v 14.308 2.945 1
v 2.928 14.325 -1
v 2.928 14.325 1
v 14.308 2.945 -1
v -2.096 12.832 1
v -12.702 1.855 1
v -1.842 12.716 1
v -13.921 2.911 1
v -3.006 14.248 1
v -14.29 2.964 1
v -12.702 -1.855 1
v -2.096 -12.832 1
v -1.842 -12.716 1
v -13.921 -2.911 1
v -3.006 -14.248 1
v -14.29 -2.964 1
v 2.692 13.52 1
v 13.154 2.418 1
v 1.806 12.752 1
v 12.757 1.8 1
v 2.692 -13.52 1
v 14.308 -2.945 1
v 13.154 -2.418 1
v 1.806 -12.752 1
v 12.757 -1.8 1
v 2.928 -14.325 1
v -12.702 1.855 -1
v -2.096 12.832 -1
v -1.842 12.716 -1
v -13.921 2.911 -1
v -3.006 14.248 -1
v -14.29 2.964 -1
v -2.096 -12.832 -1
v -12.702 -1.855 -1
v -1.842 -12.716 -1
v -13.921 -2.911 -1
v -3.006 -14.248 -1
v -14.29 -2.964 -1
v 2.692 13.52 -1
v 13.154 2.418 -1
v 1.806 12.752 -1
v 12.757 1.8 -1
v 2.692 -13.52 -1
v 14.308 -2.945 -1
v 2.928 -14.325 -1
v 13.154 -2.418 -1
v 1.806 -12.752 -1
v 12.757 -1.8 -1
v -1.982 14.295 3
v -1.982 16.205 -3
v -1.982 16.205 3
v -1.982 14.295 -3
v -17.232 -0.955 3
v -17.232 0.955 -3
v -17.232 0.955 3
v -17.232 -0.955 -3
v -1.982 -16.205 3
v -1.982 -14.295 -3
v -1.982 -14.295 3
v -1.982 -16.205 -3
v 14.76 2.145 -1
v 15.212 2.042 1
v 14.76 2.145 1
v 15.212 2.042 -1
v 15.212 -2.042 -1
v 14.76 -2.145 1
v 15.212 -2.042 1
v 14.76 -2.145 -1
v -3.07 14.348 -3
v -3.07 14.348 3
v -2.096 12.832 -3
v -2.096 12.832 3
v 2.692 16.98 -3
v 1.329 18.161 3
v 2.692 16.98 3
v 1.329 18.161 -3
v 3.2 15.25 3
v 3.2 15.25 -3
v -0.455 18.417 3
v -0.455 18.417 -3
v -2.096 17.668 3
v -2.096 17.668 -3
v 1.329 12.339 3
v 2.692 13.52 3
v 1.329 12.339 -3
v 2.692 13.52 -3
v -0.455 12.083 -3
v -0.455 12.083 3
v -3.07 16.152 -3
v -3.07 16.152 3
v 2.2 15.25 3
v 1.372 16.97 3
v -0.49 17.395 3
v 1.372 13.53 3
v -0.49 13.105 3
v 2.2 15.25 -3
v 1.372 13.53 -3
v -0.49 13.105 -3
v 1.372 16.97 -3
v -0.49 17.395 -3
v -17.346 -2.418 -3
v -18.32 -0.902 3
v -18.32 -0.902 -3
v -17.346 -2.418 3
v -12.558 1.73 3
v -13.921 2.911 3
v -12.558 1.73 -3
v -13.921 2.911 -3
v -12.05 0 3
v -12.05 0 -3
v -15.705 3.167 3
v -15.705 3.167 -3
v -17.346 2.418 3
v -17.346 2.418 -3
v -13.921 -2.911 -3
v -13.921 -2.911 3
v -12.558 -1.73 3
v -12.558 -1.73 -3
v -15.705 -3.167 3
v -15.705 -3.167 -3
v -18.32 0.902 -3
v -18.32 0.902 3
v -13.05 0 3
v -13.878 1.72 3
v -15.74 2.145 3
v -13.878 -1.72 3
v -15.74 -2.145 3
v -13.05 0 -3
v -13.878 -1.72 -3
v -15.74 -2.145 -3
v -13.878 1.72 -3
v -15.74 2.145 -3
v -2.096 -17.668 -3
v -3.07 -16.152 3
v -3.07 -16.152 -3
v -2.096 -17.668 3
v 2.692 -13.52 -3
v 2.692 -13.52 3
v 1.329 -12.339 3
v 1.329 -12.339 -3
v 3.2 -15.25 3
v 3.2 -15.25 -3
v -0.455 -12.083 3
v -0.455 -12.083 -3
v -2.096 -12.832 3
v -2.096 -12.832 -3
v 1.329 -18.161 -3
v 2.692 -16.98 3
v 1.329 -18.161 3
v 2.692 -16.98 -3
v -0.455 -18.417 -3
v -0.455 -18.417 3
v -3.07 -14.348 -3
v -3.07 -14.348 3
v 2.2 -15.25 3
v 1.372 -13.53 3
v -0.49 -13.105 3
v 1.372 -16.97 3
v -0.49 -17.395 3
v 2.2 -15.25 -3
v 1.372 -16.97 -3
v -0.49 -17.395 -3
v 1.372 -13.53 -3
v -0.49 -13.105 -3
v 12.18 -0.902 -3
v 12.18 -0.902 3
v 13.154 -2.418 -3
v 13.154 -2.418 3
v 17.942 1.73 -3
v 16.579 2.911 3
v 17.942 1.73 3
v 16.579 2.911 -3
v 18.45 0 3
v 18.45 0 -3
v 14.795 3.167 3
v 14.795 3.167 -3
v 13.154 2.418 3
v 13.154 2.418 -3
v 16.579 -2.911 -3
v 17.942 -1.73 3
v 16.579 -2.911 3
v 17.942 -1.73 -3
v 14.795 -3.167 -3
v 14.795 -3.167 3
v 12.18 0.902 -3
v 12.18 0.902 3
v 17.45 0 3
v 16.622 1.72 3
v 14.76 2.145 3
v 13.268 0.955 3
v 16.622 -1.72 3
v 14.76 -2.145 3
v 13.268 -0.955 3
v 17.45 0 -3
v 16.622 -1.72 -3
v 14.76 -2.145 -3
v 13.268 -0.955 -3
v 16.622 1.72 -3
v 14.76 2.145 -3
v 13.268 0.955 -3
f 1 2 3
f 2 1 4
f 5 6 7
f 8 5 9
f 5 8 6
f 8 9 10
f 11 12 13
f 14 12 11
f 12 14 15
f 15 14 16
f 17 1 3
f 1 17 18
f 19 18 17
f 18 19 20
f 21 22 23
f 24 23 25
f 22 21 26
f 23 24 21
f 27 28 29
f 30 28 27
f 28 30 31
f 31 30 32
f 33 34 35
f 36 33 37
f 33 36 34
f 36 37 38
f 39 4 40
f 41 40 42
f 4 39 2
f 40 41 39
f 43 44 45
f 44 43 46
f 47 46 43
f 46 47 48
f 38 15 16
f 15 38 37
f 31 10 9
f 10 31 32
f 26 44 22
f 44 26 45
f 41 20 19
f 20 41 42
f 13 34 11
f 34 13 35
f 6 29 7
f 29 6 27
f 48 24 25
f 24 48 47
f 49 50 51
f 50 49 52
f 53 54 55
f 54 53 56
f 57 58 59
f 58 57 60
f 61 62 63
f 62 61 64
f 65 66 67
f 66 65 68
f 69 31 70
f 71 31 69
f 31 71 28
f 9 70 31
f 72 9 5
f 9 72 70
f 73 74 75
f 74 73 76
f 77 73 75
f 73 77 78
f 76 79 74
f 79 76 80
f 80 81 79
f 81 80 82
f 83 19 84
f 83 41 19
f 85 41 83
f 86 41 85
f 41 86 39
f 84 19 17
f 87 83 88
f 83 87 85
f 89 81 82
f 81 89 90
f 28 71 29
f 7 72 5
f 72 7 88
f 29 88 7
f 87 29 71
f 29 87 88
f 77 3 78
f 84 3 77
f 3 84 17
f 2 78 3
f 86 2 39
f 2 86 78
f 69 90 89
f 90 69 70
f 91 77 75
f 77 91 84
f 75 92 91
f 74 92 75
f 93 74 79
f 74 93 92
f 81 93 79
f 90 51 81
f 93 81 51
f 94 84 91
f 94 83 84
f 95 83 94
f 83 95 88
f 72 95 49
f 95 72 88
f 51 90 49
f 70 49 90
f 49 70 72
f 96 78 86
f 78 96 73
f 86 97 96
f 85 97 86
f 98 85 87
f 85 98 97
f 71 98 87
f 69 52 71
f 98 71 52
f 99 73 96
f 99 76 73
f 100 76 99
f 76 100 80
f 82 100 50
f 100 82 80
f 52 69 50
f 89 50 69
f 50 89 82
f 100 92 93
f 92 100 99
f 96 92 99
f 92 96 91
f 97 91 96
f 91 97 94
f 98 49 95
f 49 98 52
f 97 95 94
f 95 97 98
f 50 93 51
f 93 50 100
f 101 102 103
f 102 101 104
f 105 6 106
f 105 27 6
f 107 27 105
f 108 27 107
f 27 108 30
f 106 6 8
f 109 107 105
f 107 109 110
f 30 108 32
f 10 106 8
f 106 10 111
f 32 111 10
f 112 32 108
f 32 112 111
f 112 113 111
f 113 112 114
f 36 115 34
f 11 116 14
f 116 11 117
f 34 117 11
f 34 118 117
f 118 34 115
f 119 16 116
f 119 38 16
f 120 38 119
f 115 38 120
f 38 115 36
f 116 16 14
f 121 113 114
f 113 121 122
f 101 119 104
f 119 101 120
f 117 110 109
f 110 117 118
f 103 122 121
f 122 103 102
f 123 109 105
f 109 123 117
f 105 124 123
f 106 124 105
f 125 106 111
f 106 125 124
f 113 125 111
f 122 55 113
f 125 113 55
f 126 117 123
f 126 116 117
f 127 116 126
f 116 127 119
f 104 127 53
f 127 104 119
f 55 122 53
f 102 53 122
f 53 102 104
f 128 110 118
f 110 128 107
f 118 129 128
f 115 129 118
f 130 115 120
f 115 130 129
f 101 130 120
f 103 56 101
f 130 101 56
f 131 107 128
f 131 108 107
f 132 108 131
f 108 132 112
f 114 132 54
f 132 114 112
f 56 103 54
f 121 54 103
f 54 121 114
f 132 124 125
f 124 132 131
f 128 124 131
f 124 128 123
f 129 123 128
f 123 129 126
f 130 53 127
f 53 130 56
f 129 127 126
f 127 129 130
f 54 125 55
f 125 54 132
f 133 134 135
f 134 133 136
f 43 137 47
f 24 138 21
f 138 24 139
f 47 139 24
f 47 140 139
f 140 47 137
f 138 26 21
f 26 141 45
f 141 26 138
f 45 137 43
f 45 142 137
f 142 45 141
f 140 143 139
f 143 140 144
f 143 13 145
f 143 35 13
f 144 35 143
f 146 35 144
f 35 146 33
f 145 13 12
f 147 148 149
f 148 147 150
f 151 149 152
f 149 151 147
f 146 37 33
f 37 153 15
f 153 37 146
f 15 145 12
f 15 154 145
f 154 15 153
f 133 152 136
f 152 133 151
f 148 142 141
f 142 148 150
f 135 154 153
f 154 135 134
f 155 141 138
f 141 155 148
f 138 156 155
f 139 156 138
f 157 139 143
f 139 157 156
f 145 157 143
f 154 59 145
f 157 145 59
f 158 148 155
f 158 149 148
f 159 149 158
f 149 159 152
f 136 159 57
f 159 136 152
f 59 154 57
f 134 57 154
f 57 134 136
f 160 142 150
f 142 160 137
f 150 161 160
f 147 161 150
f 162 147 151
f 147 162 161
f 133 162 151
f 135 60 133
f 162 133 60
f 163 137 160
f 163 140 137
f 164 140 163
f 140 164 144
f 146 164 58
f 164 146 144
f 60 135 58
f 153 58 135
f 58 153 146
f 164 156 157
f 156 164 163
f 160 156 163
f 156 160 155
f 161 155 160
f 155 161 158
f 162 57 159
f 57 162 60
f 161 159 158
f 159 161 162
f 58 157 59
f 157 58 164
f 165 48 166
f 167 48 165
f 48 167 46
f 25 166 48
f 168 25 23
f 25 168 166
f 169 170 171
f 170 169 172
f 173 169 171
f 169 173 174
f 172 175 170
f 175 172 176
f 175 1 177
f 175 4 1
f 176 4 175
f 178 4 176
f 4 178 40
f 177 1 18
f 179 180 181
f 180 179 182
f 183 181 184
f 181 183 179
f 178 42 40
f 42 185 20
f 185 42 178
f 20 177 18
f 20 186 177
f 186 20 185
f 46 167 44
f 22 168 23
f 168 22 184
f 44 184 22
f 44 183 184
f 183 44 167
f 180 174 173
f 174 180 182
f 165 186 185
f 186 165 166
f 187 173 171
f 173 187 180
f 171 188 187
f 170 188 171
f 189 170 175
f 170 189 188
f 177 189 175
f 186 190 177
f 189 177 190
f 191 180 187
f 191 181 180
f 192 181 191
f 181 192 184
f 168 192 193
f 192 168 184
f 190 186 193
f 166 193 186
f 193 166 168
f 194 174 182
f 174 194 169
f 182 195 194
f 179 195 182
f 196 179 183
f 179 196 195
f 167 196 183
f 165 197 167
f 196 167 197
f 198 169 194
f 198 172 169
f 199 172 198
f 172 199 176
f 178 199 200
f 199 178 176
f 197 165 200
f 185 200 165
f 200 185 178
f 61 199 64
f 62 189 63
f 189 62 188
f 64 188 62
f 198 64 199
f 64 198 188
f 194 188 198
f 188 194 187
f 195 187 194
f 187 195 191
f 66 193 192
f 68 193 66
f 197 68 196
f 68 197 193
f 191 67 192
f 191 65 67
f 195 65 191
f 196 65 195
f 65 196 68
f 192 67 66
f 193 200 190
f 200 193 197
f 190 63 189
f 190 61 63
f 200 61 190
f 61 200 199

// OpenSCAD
    /* This project was built by Stas Wright in an effort to make 3D Printable standoffs for quad copters that's adjustable/customizable.
    This is my 2nd OpenSCAD project & the first one built for Thingiverse Customization.
    Hopefully it works, and hopefully others can improve on it.
*/

// Standoff Height
standoff_height = 6; // [0:0.1:100]

// Standoff Inner Radius 2.2 = M2, 3.2 = M3
standoff_radius = 2.2; // [0:0.1:100]

// Standoff thickness (made this customizable due to different 3D printer nozzles)
standoff_thickness = 1;  // [0:0.1:100] 

// Distance of the holes from each other.  ex 20mm x 20mm Flight Controller.
mounting_hole_distance = 30.5; // [0:0.1:500]

// Height of the arms that connect the standoffs.
connector_height = 2; // [0:0.1:100] 


/* [Hidden] */
cyl_outside_r = standoff_radius + standoff_thickness;
mnt_distance = mounting_hole_distance/2;
mnt_holes_num = 4;

difference(){
 rotate([0,0,45]){ //this rotates the connecting arms 45degress so the corners meet the standoffs.
    difference(){
          cube([mnt_distance*1.6,mnt_distance*1.6,connector_height],true);
            cube([mnt_distance*1.35,mnt_distance*1.35,connector_height],true);
            }} // This creates the inside hole.
for (i=[1:mnt_holes_num]) { //this makes sure the inside of the standoff is open.
            translate([mnt_distance*cos(i*(360/mnt_holes_num)),mnt_distance*sin(i*(360/mnt_holes_num)),0])
           cylinder(standoff_height+1,standoff_radius,standoff_radius,center=true);}}
// This is where we create the standoffs.
for (i=[1:mnt_holes_num]) {
translate([mnt_distance*cos(i*(360/mnt_holes_num)),mnt_distance*sin(i*(360/mnt_holes_num)),0])
 difference(){
 cylinder(standoff_height,cyl_outside_r,cyl_outside_r,center=true);
// this opens up the inside of the standoff.
     cylinder(standoff_height,standoff_radius,standoff_radius,center=true);
     
 }
 }
